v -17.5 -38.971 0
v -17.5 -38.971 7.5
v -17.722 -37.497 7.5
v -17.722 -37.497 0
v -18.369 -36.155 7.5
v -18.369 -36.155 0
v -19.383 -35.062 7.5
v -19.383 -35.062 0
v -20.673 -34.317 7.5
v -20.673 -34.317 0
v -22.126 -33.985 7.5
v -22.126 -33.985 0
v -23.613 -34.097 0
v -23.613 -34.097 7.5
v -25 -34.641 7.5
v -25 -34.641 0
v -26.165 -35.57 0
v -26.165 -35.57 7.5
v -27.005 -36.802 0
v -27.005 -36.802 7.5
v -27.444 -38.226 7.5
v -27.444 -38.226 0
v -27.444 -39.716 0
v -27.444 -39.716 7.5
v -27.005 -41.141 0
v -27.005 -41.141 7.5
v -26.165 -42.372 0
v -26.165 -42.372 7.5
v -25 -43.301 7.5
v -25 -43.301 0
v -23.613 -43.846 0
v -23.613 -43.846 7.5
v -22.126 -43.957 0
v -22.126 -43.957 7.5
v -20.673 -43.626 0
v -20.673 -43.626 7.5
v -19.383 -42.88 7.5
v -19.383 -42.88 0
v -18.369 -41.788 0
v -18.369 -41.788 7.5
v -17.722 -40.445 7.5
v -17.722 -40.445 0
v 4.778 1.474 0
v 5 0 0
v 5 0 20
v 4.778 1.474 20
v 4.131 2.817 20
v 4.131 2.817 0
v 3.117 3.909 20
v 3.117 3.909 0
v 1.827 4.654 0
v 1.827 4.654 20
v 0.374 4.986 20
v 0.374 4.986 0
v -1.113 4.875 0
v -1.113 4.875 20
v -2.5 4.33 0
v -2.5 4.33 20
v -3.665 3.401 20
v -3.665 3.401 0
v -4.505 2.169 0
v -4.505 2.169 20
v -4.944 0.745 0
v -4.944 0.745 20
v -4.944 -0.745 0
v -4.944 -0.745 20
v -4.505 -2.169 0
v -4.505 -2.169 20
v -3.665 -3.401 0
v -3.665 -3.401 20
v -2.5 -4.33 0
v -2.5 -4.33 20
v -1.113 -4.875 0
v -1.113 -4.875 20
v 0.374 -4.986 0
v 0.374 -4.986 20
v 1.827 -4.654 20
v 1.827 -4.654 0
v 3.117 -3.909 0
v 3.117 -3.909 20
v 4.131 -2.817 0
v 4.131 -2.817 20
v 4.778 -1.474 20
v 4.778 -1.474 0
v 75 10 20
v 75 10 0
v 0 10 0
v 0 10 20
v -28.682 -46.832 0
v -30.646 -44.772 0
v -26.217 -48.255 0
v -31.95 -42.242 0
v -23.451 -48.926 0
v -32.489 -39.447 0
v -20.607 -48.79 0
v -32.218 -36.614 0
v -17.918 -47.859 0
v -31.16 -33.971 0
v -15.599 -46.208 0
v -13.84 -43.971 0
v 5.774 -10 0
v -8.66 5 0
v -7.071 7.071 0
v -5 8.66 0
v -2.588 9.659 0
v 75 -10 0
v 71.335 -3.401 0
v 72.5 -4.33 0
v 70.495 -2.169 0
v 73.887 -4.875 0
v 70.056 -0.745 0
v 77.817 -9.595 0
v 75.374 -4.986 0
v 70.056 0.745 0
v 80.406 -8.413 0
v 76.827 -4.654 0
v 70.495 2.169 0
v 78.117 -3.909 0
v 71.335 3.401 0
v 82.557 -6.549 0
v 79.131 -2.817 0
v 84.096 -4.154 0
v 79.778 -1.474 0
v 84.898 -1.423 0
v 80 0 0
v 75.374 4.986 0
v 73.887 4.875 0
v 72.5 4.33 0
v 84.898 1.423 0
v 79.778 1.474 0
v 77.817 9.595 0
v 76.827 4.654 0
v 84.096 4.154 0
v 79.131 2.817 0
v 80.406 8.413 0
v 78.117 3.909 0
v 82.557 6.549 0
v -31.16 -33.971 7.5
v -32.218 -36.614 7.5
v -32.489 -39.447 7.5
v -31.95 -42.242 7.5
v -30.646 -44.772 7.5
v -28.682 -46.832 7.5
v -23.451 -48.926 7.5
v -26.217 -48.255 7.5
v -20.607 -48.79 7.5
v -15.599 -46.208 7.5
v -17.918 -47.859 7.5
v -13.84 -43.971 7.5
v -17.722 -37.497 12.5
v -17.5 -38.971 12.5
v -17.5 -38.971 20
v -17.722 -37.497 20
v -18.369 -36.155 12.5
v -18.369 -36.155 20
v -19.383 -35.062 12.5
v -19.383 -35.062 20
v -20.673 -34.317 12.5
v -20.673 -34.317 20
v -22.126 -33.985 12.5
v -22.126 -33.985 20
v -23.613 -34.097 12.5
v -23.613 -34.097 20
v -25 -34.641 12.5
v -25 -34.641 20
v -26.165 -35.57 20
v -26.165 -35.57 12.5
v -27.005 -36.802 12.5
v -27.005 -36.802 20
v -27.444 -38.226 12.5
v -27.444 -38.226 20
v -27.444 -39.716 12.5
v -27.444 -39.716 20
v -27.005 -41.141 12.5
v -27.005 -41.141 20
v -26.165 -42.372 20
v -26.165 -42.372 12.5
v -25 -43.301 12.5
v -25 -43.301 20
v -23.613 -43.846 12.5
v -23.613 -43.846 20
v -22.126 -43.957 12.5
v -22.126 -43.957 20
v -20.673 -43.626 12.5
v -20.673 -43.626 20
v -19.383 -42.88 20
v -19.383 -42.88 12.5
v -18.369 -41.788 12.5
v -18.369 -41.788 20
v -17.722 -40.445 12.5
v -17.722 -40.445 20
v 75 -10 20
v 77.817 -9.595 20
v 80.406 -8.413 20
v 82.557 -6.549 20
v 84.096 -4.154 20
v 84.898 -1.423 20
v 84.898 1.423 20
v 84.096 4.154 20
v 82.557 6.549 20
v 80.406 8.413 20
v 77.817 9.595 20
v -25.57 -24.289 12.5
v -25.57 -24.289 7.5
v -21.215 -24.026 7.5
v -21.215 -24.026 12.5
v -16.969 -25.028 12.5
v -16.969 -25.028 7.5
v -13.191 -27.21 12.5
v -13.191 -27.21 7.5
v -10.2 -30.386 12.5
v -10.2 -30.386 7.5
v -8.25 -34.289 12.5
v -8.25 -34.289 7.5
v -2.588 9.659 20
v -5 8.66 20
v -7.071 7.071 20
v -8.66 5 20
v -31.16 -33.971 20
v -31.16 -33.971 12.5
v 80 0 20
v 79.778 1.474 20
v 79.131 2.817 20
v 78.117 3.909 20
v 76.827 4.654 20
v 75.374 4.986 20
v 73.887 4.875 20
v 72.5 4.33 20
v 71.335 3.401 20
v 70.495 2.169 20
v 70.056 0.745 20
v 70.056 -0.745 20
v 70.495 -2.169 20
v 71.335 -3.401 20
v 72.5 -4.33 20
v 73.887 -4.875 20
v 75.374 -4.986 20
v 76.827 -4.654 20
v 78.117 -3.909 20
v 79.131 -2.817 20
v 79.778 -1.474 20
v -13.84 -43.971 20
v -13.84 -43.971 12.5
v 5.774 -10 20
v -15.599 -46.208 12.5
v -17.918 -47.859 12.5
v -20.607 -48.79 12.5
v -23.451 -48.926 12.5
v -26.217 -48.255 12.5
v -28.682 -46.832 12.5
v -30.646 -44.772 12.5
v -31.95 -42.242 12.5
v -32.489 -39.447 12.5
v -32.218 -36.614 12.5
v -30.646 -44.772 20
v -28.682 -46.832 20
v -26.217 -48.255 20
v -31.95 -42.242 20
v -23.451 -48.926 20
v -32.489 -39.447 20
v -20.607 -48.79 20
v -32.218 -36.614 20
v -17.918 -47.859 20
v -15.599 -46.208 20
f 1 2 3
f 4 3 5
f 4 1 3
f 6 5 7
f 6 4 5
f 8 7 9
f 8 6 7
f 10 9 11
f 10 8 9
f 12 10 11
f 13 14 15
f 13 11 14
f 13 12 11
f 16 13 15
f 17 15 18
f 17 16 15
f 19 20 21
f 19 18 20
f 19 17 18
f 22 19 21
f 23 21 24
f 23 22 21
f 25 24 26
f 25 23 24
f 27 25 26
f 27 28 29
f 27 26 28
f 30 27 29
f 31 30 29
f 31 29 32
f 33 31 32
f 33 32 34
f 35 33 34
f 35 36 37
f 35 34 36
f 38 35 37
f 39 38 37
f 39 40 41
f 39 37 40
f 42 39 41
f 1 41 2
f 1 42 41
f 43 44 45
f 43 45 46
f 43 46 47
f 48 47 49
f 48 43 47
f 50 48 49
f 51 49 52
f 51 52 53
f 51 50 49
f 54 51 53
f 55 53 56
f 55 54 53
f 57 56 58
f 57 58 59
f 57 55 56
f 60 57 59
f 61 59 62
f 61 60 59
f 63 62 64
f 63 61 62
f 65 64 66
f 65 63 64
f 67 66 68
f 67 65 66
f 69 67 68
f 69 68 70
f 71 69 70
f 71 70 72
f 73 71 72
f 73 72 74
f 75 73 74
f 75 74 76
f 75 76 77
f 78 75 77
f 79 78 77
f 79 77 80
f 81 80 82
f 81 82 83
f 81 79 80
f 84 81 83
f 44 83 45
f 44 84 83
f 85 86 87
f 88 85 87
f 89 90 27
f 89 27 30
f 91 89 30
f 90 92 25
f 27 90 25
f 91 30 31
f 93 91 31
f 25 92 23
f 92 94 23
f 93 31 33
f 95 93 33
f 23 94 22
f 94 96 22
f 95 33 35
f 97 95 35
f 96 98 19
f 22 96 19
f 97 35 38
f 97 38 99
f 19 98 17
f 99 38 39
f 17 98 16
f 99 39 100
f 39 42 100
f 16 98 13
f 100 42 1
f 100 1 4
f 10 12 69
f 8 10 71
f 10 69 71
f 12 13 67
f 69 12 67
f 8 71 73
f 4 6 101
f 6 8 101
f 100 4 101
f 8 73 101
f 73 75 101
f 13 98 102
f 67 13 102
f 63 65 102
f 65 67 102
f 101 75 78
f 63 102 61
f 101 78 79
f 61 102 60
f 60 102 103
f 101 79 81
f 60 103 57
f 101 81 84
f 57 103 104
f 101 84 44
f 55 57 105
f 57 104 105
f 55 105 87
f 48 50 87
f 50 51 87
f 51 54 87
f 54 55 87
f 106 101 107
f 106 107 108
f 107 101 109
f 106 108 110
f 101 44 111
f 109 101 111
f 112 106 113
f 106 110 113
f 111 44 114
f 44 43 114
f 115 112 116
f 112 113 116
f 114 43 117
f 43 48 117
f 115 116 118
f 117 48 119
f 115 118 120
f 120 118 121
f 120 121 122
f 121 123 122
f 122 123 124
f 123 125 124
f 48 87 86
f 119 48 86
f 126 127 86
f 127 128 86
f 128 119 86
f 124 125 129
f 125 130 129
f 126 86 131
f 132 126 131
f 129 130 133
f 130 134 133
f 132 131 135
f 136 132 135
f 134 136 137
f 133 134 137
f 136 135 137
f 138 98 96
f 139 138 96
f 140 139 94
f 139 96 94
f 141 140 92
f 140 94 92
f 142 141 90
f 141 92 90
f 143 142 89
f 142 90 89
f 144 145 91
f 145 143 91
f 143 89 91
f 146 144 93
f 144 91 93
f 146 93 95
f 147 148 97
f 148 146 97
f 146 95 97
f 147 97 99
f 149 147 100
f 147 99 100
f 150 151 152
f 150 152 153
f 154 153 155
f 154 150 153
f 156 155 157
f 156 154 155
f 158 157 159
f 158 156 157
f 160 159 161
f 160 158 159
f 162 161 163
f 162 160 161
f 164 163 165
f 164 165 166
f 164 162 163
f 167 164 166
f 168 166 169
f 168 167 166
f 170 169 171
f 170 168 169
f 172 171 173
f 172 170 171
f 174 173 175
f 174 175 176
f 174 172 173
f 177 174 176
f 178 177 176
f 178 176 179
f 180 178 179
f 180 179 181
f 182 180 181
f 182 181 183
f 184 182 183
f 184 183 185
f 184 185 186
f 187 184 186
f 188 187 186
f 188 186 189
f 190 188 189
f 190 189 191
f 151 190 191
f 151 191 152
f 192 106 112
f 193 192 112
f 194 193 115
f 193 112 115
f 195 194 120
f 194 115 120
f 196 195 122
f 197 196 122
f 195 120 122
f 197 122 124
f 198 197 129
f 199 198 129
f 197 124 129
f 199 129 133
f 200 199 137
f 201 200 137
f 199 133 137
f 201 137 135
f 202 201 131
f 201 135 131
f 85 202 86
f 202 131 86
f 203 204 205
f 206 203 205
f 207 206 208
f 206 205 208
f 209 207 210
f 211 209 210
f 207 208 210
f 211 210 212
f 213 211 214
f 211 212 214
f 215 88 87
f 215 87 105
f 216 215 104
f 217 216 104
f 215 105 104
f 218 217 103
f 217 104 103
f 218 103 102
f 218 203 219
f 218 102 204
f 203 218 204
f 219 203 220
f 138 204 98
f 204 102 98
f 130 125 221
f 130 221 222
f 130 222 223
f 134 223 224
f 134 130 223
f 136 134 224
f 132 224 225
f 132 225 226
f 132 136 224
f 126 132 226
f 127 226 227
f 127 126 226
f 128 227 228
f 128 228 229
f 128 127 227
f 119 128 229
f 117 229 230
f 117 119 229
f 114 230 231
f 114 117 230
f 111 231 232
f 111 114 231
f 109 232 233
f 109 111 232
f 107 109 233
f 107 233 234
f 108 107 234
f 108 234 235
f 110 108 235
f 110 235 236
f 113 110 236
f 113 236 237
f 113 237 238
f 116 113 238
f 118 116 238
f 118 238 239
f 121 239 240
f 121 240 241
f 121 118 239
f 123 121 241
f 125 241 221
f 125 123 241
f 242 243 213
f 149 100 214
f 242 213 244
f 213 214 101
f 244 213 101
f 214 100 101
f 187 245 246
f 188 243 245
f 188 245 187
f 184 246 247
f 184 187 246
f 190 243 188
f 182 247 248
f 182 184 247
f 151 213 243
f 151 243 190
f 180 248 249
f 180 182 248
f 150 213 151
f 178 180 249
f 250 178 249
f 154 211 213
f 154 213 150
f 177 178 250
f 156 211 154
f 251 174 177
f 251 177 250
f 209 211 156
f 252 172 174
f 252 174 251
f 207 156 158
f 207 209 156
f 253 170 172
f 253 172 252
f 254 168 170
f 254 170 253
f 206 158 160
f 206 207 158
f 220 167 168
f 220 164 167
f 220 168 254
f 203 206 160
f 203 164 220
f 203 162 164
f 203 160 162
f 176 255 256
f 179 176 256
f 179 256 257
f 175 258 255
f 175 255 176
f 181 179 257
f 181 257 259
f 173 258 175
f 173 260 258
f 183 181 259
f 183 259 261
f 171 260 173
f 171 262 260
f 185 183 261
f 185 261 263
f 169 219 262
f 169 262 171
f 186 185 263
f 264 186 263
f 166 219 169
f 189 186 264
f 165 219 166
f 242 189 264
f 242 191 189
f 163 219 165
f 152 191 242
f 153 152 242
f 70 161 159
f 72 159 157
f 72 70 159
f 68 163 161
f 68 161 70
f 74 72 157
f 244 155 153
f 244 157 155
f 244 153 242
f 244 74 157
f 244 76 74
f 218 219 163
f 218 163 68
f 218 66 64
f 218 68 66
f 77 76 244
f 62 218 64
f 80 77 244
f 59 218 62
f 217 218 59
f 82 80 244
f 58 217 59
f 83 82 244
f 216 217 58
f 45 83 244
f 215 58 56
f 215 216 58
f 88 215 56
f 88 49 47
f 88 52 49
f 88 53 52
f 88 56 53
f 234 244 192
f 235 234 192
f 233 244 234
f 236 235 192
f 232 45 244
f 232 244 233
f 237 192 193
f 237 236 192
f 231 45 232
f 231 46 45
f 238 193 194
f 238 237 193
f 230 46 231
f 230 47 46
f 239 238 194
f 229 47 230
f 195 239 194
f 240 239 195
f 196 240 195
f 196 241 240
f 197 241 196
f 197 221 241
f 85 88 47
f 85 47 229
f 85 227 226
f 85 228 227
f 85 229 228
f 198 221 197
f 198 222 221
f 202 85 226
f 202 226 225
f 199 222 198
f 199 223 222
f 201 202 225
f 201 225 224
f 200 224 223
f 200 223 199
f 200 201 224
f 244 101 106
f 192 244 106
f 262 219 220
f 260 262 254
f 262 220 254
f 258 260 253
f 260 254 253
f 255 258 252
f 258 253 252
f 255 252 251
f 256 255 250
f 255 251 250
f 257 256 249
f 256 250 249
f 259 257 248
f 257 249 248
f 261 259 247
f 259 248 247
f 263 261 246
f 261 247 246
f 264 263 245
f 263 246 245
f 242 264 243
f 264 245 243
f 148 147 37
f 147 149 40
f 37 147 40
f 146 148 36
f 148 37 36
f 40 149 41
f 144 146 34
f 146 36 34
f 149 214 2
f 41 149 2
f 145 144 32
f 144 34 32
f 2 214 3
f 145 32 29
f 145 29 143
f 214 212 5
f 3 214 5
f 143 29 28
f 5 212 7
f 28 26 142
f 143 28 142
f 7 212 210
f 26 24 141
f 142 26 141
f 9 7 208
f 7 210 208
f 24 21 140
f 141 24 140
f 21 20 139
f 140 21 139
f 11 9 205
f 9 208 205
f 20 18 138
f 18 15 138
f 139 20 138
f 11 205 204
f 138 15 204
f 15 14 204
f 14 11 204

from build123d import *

# Parameters (mm, degrees)
SKETCH1_R           = 5
BOSS_EXTRUDE1_DEPTH = 20
SKETCH4_R           = 15
CUT_EXTRUDE1_DEPTH  = 2.5


with BuildPart() as part:
    # Sketch1 → Boss-Extrude1 (new body)
    with BuildSketch(Plane.XY):
        with BuildLine():
            Line((5.773502692, -10), (75, -10))
            ThreePointArc((75, -10), (85, 0), (75, 10))
            Line((75, 10), (0, 10))
            ThreePointArc((0, 10), (-5, 8.660254038), (-8.660254038, 5))
            Line((-8.660254038, 5), (-31.160254038, -33.97114317))
            ThreePointArc((-31.160254038, -33.97114317), (-27.5, -47.631397208), (-13.839745962, -43.97114317))
            Line((-13.839745962, -43.97114317), (5.773502692, -10))
        make_face()
        with Locations((-22.5, -38.97114317)):
            Circle(SKETCH1_R, mode=Mode.SUBTRACT)
        Circle(SKETCH1_R, mode=Mode.SUBTRACT)
        with Locations((75, 0)):
            Circle(SKETCH1_R, mode=Mode.SUBTRACT)
    extrude(amount=BOSS_EXTRUDE1_DEPTH)

    # Sketch4 → Cut-Extrude1 (cut, symmetric)
    with BuildSketch(Plane(origin=(0, 0, 10), x_dir=(-1, 0, 0), z_dir=(0, 0, -1))):
        with Locations((22.5, -38.97114317)):
            Circle(SKETCH4_R)
    extrude(amount=CUT_EXTRUDE1_DEPTH, both=True, mode=Mode.SUBTRACT)


solid = part.part
